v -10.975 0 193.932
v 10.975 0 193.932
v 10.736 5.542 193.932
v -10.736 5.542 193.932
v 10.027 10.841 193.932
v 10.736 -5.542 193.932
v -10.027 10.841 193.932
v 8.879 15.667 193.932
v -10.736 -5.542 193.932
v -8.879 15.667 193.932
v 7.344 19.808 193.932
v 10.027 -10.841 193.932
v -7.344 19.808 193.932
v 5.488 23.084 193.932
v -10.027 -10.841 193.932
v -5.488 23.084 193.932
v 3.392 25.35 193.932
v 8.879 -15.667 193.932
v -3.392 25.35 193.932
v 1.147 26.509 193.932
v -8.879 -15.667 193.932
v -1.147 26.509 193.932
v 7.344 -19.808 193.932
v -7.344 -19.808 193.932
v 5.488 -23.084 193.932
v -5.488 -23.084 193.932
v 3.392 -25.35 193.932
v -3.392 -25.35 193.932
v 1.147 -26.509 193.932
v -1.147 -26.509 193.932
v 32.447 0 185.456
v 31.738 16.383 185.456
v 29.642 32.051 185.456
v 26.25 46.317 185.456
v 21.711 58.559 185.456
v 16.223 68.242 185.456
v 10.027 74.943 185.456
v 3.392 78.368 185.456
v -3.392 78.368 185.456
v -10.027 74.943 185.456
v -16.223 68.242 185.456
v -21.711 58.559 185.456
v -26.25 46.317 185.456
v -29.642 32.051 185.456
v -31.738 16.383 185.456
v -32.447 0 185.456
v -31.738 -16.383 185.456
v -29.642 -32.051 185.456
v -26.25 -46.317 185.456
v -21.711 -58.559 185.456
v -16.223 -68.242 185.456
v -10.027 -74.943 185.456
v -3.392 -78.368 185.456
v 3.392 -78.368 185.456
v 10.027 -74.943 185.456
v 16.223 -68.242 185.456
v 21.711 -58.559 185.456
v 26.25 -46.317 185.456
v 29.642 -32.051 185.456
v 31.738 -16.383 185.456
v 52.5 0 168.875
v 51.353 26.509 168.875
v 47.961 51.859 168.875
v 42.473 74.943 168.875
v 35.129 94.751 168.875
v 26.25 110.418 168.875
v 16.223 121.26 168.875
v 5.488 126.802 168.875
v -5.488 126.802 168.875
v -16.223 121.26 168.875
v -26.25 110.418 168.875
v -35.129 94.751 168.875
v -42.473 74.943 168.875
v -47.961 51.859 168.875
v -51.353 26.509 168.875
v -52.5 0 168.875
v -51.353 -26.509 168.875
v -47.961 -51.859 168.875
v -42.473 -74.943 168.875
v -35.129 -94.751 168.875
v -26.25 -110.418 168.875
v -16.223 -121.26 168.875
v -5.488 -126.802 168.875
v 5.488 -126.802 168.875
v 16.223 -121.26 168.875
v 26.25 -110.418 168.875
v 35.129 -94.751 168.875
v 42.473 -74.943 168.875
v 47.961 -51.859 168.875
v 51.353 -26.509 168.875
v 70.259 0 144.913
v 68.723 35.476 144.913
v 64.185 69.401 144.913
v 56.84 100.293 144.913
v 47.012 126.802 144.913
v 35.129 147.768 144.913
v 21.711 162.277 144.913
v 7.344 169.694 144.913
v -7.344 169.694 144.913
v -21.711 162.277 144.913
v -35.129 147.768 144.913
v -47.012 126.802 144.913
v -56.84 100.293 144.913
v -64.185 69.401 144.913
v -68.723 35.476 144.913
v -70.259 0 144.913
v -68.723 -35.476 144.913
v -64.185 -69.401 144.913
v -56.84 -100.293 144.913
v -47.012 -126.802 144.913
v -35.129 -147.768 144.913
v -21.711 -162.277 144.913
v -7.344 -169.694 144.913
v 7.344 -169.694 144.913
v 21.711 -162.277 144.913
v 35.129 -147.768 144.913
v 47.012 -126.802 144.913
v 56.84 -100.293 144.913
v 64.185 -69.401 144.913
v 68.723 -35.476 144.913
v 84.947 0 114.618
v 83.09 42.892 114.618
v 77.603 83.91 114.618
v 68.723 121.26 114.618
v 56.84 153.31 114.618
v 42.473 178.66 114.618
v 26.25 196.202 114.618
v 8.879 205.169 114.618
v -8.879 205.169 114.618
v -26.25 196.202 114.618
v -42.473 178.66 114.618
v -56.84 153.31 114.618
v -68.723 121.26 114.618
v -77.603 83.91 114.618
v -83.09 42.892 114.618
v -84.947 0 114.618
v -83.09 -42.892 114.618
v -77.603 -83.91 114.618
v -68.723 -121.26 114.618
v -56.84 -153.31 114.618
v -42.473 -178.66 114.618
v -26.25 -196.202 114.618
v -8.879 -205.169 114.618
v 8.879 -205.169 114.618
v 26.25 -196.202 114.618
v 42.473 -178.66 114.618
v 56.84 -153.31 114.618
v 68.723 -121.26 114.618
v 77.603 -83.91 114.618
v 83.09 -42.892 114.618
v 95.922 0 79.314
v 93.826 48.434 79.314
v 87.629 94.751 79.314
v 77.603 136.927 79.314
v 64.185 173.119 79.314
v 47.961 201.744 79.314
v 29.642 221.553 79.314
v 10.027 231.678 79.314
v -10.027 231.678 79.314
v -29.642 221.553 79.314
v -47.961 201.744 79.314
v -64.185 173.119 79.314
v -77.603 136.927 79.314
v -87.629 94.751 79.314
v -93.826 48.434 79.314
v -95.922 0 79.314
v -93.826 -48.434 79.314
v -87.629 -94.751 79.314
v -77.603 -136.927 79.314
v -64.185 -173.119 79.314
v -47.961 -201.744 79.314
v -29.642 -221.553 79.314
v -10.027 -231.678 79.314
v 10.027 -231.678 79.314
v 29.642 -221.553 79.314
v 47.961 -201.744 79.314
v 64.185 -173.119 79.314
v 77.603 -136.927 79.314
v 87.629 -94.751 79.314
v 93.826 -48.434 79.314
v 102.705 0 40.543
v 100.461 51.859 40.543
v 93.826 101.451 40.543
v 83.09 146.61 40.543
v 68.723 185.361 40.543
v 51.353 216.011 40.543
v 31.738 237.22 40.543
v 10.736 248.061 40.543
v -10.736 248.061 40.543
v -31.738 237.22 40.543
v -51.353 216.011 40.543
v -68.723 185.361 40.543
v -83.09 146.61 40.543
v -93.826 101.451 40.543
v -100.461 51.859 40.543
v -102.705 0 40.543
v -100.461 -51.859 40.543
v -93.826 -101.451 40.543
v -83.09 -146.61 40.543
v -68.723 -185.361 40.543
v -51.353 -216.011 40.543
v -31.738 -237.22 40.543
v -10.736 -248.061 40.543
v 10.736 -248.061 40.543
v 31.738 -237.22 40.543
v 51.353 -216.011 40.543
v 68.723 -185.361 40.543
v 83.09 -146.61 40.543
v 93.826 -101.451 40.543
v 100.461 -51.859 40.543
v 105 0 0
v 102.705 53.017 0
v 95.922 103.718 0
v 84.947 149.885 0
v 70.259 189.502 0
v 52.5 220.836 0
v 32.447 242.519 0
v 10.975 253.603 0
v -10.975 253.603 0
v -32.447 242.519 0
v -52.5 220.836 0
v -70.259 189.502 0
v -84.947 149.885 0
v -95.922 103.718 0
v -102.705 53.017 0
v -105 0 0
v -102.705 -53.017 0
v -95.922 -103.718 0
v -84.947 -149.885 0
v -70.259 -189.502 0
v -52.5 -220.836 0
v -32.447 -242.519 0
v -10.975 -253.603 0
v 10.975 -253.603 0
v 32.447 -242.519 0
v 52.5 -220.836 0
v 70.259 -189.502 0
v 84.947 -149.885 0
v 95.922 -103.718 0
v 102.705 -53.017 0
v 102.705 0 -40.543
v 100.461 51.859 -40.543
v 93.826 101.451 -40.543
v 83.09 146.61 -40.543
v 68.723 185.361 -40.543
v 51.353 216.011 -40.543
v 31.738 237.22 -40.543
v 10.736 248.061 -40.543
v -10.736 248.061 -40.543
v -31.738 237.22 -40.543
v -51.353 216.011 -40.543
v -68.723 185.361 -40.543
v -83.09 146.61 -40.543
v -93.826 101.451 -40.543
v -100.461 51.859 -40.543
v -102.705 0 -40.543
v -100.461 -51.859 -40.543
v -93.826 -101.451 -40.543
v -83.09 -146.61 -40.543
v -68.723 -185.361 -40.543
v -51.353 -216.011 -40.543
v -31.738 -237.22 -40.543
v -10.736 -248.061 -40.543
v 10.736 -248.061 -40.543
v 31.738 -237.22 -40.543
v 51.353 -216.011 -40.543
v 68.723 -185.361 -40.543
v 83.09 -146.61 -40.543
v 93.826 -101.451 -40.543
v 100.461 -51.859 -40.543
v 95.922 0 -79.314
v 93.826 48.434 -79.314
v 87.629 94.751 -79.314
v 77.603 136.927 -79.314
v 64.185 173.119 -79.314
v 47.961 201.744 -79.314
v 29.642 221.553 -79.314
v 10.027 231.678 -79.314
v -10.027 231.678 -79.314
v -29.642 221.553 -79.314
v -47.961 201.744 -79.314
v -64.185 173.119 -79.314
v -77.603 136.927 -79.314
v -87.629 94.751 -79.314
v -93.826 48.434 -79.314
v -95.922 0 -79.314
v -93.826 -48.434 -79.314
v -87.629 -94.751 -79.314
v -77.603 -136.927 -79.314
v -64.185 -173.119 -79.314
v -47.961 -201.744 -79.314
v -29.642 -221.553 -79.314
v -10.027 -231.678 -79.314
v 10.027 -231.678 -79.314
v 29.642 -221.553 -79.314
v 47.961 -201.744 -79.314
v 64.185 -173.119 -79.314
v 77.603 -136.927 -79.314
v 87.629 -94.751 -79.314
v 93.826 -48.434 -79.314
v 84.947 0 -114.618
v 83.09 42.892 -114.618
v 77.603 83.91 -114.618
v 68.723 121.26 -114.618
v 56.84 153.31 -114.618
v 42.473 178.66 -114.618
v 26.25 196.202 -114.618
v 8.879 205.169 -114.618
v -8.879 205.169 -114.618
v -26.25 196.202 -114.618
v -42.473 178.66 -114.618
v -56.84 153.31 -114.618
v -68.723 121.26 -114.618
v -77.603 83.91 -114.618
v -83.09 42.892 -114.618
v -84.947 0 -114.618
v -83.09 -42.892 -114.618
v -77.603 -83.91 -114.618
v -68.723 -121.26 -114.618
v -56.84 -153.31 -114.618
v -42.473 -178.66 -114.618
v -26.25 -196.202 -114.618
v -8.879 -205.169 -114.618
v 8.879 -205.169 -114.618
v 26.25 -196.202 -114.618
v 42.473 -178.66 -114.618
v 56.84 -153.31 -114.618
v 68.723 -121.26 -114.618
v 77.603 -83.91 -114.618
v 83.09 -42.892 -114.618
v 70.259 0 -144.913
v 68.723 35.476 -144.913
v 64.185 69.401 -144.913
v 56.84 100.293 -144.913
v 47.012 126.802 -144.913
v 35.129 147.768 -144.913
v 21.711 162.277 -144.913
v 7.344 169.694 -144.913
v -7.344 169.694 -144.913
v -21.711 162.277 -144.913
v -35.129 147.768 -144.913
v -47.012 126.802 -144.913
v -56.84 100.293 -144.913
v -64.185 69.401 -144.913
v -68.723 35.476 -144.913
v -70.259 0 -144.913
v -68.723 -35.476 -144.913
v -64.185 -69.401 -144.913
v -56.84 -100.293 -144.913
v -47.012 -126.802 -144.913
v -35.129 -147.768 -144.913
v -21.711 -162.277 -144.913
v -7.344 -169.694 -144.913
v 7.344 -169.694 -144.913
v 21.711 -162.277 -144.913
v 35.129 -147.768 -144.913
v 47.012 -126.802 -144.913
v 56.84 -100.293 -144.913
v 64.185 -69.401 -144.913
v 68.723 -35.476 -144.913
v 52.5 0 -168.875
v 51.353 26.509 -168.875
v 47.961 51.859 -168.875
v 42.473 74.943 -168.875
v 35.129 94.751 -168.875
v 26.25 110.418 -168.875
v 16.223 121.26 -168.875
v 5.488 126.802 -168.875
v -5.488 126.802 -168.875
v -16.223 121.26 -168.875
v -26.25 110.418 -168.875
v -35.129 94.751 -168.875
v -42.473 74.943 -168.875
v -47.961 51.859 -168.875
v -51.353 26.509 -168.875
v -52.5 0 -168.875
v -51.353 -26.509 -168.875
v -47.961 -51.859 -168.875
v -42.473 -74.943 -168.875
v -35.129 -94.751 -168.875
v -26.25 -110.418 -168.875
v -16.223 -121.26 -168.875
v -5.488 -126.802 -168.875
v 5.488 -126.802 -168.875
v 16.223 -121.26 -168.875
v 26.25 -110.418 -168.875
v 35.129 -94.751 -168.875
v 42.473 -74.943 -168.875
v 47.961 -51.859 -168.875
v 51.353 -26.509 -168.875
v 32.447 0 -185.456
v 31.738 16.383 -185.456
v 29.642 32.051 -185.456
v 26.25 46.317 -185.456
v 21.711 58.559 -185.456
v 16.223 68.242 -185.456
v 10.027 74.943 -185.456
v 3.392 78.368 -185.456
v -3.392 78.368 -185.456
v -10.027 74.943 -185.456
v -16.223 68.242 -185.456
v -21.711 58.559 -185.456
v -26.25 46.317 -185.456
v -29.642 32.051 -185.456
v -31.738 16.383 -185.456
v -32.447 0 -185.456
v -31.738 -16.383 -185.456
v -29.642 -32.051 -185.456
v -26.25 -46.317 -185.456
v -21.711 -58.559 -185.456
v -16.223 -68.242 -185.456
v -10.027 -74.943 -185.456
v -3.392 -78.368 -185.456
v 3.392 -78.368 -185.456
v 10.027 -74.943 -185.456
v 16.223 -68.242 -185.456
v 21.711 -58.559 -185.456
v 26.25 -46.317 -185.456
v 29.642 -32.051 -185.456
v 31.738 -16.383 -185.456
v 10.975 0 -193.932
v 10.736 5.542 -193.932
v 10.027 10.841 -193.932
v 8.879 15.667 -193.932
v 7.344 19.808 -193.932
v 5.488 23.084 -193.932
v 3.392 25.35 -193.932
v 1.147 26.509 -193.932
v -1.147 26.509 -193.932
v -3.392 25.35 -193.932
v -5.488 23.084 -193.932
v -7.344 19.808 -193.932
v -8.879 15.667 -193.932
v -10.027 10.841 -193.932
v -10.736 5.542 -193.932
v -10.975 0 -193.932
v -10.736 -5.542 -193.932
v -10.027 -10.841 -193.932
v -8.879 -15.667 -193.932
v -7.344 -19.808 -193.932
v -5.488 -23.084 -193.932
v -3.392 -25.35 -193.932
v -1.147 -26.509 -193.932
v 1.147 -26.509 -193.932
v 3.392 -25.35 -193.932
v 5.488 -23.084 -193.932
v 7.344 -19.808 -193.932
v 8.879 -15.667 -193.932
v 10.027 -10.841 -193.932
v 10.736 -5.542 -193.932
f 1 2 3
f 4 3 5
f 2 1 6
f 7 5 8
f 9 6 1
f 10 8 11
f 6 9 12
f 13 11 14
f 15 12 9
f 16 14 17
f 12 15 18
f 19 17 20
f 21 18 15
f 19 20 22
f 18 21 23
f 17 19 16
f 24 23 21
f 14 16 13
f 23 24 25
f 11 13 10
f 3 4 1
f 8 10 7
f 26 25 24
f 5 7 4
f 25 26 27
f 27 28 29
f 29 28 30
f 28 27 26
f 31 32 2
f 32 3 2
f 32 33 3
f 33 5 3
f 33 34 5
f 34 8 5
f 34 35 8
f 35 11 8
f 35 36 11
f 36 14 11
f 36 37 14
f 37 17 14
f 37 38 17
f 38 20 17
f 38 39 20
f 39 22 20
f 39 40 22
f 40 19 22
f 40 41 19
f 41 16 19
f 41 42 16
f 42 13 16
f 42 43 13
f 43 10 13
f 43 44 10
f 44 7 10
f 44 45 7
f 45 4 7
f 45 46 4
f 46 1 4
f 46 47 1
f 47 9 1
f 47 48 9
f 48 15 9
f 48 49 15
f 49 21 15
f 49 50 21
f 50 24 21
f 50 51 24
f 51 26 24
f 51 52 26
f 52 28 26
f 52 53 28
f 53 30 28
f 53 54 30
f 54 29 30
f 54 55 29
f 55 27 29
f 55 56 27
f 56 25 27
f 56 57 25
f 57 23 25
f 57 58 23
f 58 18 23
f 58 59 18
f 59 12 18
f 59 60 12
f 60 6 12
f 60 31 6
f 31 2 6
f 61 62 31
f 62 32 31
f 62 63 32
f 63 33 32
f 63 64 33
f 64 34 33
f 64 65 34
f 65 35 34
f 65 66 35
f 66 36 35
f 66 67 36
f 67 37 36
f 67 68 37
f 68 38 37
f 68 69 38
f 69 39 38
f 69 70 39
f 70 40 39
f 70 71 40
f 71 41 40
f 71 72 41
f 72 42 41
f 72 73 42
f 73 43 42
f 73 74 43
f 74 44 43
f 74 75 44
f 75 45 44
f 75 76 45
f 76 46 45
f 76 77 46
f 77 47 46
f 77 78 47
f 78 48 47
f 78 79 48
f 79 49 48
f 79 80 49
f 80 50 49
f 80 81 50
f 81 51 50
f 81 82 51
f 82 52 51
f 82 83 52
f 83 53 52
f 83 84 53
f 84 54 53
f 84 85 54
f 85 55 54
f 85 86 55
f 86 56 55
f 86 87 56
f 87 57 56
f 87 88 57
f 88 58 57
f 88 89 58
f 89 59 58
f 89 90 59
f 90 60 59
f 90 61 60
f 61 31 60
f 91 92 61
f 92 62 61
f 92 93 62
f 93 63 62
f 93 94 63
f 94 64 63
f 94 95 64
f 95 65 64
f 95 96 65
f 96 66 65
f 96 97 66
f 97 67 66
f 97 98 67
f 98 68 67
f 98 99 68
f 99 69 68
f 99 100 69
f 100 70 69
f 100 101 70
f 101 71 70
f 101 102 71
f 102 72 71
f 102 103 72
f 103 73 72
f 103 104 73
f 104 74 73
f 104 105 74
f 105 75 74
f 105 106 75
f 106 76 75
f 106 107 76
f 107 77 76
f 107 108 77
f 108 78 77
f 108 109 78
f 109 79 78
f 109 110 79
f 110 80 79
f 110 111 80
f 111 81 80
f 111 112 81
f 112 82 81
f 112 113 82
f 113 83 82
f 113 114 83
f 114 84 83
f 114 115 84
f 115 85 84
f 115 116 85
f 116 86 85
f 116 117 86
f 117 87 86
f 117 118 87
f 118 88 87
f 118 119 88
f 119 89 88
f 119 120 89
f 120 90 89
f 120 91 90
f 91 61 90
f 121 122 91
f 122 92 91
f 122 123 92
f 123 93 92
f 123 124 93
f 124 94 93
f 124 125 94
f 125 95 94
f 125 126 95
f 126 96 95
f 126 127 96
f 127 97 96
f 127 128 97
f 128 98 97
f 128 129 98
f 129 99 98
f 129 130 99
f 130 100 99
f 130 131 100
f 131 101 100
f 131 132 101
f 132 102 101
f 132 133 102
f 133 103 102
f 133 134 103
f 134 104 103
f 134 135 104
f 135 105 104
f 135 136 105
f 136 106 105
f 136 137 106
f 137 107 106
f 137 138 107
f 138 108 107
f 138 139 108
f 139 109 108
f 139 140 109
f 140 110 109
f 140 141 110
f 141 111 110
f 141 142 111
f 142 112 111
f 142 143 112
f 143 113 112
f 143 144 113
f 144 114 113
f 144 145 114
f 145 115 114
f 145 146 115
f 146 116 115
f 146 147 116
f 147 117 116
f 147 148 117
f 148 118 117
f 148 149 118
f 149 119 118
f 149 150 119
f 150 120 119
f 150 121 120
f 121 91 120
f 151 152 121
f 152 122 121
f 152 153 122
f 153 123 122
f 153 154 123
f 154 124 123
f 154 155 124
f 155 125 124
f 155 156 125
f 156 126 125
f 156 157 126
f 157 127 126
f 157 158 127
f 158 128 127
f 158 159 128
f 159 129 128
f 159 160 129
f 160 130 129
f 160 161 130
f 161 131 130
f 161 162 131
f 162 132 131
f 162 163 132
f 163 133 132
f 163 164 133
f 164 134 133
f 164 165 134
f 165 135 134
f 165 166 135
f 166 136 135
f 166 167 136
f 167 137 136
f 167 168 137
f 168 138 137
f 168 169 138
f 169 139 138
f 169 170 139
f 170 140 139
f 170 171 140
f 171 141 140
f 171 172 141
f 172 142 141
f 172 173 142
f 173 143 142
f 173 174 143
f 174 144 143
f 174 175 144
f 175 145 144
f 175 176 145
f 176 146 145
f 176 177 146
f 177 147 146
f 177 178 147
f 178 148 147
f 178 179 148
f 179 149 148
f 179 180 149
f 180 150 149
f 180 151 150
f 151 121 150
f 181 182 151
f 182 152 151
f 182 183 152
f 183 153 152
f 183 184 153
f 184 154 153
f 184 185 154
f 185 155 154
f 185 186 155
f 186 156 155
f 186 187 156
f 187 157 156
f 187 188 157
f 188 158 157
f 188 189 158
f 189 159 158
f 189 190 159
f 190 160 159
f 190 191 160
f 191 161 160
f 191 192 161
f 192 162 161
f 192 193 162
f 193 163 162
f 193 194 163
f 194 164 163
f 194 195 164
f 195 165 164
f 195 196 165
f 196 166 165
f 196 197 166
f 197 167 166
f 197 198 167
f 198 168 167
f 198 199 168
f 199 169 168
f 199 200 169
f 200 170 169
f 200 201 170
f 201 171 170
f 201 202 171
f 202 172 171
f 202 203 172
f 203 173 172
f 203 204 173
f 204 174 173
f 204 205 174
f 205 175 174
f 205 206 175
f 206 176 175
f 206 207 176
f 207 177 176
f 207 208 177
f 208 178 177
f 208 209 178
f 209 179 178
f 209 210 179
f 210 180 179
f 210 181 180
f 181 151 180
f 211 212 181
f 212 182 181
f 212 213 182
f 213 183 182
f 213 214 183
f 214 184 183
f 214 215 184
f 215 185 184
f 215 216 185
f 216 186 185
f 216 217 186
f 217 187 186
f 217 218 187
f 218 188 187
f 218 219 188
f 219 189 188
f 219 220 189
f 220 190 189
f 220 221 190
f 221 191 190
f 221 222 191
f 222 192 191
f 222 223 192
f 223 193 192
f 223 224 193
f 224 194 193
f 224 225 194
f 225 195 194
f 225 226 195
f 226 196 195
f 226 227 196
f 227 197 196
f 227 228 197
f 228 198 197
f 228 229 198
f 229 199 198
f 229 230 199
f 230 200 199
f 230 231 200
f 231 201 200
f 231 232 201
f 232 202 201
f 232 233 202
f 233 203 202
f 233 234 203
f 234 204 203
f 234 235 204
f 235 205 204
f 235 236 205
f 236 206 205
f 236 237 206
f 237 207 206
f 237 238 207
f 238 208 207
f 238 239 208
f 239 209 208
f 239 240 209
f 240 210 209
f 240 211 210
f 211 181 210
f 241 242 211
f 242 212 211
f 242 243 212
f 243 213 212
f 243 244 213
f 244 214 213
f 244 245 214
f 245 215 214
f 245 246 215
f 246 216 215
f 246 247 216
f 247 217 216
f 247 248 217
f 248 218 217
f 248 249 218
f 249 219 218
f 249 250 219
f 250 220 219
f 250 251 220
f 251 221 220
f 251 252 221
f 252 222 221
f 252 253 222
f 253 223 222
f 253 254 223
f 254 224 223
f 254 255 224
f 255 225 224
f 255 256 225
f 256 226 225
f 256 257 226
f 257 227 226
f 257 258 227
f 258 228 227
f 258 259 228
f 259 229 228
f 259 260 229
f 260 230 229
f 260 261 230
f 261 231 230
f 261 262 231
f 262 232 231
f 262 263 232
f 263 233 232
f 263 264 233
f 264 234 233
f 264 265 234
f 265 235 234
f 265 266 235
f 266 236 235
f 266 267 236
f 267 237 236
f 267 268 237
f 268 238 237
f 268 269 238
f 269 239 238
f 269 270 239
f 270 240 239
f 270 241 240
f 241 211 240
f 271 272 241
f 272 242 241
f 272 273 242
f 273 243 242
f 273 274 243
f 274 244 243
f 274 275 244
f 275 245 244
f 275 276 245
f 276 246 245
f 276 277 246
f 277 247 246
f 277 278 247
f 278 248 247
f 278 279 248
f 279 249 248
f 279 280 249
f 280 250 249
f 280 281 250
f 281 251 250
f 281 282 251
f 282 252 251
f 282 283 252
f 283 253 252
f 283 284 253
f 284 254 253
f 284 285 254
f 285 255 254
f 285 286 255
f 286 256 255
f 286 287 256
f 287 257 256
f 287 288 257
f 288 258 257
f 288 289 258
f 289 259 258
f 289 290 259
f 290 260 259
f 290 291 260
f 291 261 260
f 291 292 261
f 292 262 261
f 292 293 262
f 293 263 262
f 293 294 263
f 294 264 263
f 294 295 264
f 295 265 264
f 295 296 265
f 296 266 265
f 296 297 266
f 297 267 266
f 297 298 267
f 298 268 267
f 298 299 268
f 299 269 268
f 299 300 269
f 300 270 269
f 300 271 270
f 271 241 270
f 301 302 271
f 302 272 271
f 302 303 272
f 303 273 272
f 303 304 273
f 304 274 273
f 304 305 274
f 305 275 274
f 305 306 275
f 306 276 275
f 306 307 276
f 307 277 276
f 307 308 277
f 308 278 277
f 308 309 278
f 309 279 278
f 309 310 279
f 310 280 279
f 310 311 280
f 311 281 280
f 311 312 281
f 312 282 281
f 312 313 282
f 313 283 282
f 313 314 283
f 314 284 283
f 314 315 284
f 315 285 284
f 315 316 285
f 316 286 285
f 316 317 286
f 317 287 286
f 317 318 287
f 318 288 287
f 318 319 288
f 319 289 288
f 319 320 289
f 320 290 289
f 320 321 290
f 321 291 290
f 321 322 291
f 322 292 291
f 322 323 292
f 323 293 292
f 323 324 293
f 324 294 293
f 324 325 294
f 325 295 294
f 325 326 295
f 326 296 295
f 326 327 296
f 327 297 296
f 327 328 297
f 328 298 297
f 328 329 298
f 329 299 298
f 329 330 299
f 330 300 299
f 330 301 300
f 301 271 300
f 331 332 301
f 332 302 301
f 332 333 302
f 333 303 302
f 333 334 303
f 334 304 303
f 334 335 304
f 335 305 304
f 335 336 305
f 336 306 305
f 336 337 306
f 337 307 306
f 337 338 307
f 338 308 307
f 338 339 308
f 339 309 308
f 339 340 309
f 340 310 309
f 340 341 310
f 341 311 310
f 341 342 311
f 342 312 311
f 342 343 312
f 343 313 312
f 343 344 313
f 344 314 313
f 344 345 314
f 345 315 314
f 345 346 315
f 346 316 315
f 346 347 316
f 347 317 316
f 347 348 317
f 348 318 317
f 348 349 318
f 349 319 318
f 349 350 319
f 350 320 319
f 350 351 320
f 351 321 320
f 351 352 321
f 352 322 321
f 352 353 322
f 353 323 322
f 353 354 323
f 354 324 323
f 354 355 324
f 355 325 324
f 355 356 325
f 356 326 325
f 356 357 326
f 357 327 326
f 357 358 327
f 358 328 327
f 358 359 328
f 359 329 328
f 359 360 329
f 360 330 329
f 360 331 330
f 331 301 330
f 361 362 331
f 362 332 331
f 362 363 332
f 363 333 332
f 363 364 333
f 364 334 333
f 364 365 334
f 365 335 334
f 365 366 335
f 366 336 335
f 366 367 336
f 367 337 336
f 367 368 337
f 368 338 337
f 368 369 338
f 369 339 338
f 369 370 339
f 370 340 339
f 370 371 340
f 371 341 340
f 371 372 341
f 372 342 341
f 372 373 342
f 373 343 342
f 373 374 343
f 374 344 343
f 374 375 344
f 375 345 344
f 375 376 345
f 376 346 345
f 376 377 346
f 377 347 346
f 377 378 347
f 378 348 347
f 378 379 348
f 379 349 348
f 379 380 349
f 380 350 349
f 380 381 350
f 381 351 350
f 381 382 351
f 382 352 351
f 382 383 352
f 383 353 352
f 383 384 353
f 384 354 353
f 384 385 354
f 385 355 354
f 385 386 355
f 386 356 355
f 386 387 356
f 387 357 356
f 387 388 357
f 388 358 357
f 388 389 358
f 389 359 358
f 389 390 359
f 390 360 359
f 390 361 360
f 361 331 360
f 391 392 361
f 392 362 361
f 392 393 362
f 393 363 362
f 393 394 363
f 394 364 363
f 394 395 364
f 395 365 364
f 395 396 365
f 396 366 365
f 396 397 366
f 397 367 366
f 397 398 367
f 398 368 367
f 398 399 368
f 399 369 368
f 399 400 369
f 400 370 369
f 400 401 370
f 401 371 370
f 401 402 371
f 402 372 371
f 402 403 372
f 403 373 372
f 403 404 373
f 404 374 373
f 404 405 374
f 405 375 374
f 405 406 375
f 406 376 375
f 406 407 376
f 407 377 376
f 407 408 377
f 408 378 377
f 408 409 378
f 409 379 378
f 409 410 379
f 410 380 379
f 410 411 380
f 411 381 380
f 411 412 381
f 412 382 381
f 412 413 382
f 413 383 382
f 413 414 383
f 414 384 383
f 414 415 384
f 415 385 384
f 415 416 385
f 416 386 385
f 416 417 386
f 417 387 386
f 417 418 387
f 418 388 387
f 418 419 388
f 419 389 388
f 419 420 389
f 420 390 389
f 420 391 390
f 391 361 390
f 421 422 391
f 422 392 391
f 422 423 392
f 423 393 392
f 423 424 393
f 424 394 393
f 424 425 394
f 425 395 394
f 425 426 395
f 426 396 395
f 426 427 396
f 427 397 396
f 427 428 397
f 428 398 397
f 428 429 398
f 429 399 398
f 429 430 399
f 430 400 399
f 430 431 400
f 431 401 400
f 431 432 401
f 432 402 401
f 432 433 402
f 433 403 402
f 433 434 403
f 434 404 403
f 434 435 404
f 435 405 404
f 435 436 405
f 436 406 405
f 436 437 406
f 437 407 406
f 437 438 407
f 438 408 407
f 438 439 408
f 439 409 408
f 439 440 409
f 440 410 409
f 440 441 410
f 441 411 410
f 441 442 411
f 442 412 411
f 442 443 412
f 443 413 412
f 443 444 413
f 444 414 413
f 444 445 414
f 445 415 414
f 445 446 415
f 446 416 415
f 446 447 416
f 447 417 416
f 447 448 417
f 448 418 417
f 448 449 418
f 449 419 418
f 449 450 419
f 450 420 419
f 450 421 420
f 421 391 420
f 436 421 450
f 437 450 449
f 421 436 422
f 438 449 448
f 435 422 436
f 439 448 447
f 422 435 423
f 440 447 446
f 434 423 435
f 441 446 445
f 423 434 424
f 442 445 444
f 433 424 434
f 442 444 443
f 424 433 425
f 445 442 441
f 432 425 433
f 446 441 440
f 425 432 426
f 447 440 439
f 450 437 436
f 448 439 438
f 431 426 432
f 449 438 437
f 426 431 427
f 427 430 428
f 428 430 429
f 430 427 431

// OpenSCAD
// Generated by SolidPython 1.0.1 on 2020-07-29 00:46:48


scale(v = [7, 17, 13]) {
	sphere(r = 15);
}
/***********************************************
*********      SolidPython code:      **********
************************************************
 
# import packages: SolidPython
from solid import *
from solid.utils import *
from itertools import chain, combinations, permutations


class Resize:

    def __init__(self, scad_file):
        self.scad_file = scad_file
        #self.scad_file = import_scad(scad_file)
        # cone/cylinder param:
        self.r1 = 0
        self.r2 = 0
        self.h = 0
        # rectangular prism param:
        self.w = 0
        self.l = 0
        # ellipse param:
        self.r = 0

    # import OpenScad code (file name corresponds to shape)


    # classify shape + parameters
    def assign(self, param1, param2, param3):
        if self.scad_file == 'cone.scad':
            self.r1 = param1
            self.r2 = param2
            self.h = param3
        elif self.scad_file == 'cylinder.scad':
            self.r1 = param1
            self.r2 = param2
            self.h = param3
        elif self.scad_file == 'rectangularPrism.scad':
            self.h = param1
            self.l = param2
            self.w = param3
        else:
            self.r = param1
            self.h = param2

    # resize parameters
    def iterate(self):
        x = range(3, 20, 2)
        i = 1
        if self.scad_file == 'cone.scad':
            tempList = list(permutations(x, 2))
            for temp in tempList:
                param1 = temp[0]
                param2 = temp[1]
                filepath = 'produced_scad_files/' + 'cone' + str(param1) + '_' + str(param2) + '_' + '.scad'
                scad_render_to_file(cylinder(h=param1, r1=param2, r2=0), filepath)

        elif self.scad_file == 'cylinder.scad':
            tempList = list(permutations(x, 3))
            for temp in tempList:
                param1 = temp[0]
                param2 = temp[1]
                filepath = 'produced_scad_files/' + 'cylinder' + str(param1) + '_' + str(param2) + '_' + '.scad'
                scad_render_to_file(cylinder(h=param1, r1=param2, r2=param2), filepath)

        elif self.scad_file == 'rectangularPrism.scad':
            tempList = list(permutations(x, 3))
            for temp in tempList:
                param1 = temp[0]
                param2 = temp[1]
                param3 = temp[2]
                filepath = 'produced_scad_files/' + 'rectangularPrism' + str(param1) + '_' + str(param2) + '_' + str(
                    param3) + '.scad'
                scad_render_to_file(cube(size=(param1, param2, param3)), filepath)

        elif self.scad_file == 'ellipse.scad':
            tempList = list(permutations(x, 4))
            for temp in tempList:
                param1 = temp[0]
                param2 = temp[1]
                param3 = temp[2]
                param4 = temp[3]
                filepath = 'produced_scad_files/' + 'ellipse' + str(param1) + '_' + str(param2) + '_' + str(param3) + '_' + str(param4) + '.scad'
                scad_render_to_file(scale([param1, param2, param3])(sphere(r=param4)), filepath)

    def render_to_scadfile(self):
        scad_render_to_file(scad, 'example.scad') 
 
************************************************/
